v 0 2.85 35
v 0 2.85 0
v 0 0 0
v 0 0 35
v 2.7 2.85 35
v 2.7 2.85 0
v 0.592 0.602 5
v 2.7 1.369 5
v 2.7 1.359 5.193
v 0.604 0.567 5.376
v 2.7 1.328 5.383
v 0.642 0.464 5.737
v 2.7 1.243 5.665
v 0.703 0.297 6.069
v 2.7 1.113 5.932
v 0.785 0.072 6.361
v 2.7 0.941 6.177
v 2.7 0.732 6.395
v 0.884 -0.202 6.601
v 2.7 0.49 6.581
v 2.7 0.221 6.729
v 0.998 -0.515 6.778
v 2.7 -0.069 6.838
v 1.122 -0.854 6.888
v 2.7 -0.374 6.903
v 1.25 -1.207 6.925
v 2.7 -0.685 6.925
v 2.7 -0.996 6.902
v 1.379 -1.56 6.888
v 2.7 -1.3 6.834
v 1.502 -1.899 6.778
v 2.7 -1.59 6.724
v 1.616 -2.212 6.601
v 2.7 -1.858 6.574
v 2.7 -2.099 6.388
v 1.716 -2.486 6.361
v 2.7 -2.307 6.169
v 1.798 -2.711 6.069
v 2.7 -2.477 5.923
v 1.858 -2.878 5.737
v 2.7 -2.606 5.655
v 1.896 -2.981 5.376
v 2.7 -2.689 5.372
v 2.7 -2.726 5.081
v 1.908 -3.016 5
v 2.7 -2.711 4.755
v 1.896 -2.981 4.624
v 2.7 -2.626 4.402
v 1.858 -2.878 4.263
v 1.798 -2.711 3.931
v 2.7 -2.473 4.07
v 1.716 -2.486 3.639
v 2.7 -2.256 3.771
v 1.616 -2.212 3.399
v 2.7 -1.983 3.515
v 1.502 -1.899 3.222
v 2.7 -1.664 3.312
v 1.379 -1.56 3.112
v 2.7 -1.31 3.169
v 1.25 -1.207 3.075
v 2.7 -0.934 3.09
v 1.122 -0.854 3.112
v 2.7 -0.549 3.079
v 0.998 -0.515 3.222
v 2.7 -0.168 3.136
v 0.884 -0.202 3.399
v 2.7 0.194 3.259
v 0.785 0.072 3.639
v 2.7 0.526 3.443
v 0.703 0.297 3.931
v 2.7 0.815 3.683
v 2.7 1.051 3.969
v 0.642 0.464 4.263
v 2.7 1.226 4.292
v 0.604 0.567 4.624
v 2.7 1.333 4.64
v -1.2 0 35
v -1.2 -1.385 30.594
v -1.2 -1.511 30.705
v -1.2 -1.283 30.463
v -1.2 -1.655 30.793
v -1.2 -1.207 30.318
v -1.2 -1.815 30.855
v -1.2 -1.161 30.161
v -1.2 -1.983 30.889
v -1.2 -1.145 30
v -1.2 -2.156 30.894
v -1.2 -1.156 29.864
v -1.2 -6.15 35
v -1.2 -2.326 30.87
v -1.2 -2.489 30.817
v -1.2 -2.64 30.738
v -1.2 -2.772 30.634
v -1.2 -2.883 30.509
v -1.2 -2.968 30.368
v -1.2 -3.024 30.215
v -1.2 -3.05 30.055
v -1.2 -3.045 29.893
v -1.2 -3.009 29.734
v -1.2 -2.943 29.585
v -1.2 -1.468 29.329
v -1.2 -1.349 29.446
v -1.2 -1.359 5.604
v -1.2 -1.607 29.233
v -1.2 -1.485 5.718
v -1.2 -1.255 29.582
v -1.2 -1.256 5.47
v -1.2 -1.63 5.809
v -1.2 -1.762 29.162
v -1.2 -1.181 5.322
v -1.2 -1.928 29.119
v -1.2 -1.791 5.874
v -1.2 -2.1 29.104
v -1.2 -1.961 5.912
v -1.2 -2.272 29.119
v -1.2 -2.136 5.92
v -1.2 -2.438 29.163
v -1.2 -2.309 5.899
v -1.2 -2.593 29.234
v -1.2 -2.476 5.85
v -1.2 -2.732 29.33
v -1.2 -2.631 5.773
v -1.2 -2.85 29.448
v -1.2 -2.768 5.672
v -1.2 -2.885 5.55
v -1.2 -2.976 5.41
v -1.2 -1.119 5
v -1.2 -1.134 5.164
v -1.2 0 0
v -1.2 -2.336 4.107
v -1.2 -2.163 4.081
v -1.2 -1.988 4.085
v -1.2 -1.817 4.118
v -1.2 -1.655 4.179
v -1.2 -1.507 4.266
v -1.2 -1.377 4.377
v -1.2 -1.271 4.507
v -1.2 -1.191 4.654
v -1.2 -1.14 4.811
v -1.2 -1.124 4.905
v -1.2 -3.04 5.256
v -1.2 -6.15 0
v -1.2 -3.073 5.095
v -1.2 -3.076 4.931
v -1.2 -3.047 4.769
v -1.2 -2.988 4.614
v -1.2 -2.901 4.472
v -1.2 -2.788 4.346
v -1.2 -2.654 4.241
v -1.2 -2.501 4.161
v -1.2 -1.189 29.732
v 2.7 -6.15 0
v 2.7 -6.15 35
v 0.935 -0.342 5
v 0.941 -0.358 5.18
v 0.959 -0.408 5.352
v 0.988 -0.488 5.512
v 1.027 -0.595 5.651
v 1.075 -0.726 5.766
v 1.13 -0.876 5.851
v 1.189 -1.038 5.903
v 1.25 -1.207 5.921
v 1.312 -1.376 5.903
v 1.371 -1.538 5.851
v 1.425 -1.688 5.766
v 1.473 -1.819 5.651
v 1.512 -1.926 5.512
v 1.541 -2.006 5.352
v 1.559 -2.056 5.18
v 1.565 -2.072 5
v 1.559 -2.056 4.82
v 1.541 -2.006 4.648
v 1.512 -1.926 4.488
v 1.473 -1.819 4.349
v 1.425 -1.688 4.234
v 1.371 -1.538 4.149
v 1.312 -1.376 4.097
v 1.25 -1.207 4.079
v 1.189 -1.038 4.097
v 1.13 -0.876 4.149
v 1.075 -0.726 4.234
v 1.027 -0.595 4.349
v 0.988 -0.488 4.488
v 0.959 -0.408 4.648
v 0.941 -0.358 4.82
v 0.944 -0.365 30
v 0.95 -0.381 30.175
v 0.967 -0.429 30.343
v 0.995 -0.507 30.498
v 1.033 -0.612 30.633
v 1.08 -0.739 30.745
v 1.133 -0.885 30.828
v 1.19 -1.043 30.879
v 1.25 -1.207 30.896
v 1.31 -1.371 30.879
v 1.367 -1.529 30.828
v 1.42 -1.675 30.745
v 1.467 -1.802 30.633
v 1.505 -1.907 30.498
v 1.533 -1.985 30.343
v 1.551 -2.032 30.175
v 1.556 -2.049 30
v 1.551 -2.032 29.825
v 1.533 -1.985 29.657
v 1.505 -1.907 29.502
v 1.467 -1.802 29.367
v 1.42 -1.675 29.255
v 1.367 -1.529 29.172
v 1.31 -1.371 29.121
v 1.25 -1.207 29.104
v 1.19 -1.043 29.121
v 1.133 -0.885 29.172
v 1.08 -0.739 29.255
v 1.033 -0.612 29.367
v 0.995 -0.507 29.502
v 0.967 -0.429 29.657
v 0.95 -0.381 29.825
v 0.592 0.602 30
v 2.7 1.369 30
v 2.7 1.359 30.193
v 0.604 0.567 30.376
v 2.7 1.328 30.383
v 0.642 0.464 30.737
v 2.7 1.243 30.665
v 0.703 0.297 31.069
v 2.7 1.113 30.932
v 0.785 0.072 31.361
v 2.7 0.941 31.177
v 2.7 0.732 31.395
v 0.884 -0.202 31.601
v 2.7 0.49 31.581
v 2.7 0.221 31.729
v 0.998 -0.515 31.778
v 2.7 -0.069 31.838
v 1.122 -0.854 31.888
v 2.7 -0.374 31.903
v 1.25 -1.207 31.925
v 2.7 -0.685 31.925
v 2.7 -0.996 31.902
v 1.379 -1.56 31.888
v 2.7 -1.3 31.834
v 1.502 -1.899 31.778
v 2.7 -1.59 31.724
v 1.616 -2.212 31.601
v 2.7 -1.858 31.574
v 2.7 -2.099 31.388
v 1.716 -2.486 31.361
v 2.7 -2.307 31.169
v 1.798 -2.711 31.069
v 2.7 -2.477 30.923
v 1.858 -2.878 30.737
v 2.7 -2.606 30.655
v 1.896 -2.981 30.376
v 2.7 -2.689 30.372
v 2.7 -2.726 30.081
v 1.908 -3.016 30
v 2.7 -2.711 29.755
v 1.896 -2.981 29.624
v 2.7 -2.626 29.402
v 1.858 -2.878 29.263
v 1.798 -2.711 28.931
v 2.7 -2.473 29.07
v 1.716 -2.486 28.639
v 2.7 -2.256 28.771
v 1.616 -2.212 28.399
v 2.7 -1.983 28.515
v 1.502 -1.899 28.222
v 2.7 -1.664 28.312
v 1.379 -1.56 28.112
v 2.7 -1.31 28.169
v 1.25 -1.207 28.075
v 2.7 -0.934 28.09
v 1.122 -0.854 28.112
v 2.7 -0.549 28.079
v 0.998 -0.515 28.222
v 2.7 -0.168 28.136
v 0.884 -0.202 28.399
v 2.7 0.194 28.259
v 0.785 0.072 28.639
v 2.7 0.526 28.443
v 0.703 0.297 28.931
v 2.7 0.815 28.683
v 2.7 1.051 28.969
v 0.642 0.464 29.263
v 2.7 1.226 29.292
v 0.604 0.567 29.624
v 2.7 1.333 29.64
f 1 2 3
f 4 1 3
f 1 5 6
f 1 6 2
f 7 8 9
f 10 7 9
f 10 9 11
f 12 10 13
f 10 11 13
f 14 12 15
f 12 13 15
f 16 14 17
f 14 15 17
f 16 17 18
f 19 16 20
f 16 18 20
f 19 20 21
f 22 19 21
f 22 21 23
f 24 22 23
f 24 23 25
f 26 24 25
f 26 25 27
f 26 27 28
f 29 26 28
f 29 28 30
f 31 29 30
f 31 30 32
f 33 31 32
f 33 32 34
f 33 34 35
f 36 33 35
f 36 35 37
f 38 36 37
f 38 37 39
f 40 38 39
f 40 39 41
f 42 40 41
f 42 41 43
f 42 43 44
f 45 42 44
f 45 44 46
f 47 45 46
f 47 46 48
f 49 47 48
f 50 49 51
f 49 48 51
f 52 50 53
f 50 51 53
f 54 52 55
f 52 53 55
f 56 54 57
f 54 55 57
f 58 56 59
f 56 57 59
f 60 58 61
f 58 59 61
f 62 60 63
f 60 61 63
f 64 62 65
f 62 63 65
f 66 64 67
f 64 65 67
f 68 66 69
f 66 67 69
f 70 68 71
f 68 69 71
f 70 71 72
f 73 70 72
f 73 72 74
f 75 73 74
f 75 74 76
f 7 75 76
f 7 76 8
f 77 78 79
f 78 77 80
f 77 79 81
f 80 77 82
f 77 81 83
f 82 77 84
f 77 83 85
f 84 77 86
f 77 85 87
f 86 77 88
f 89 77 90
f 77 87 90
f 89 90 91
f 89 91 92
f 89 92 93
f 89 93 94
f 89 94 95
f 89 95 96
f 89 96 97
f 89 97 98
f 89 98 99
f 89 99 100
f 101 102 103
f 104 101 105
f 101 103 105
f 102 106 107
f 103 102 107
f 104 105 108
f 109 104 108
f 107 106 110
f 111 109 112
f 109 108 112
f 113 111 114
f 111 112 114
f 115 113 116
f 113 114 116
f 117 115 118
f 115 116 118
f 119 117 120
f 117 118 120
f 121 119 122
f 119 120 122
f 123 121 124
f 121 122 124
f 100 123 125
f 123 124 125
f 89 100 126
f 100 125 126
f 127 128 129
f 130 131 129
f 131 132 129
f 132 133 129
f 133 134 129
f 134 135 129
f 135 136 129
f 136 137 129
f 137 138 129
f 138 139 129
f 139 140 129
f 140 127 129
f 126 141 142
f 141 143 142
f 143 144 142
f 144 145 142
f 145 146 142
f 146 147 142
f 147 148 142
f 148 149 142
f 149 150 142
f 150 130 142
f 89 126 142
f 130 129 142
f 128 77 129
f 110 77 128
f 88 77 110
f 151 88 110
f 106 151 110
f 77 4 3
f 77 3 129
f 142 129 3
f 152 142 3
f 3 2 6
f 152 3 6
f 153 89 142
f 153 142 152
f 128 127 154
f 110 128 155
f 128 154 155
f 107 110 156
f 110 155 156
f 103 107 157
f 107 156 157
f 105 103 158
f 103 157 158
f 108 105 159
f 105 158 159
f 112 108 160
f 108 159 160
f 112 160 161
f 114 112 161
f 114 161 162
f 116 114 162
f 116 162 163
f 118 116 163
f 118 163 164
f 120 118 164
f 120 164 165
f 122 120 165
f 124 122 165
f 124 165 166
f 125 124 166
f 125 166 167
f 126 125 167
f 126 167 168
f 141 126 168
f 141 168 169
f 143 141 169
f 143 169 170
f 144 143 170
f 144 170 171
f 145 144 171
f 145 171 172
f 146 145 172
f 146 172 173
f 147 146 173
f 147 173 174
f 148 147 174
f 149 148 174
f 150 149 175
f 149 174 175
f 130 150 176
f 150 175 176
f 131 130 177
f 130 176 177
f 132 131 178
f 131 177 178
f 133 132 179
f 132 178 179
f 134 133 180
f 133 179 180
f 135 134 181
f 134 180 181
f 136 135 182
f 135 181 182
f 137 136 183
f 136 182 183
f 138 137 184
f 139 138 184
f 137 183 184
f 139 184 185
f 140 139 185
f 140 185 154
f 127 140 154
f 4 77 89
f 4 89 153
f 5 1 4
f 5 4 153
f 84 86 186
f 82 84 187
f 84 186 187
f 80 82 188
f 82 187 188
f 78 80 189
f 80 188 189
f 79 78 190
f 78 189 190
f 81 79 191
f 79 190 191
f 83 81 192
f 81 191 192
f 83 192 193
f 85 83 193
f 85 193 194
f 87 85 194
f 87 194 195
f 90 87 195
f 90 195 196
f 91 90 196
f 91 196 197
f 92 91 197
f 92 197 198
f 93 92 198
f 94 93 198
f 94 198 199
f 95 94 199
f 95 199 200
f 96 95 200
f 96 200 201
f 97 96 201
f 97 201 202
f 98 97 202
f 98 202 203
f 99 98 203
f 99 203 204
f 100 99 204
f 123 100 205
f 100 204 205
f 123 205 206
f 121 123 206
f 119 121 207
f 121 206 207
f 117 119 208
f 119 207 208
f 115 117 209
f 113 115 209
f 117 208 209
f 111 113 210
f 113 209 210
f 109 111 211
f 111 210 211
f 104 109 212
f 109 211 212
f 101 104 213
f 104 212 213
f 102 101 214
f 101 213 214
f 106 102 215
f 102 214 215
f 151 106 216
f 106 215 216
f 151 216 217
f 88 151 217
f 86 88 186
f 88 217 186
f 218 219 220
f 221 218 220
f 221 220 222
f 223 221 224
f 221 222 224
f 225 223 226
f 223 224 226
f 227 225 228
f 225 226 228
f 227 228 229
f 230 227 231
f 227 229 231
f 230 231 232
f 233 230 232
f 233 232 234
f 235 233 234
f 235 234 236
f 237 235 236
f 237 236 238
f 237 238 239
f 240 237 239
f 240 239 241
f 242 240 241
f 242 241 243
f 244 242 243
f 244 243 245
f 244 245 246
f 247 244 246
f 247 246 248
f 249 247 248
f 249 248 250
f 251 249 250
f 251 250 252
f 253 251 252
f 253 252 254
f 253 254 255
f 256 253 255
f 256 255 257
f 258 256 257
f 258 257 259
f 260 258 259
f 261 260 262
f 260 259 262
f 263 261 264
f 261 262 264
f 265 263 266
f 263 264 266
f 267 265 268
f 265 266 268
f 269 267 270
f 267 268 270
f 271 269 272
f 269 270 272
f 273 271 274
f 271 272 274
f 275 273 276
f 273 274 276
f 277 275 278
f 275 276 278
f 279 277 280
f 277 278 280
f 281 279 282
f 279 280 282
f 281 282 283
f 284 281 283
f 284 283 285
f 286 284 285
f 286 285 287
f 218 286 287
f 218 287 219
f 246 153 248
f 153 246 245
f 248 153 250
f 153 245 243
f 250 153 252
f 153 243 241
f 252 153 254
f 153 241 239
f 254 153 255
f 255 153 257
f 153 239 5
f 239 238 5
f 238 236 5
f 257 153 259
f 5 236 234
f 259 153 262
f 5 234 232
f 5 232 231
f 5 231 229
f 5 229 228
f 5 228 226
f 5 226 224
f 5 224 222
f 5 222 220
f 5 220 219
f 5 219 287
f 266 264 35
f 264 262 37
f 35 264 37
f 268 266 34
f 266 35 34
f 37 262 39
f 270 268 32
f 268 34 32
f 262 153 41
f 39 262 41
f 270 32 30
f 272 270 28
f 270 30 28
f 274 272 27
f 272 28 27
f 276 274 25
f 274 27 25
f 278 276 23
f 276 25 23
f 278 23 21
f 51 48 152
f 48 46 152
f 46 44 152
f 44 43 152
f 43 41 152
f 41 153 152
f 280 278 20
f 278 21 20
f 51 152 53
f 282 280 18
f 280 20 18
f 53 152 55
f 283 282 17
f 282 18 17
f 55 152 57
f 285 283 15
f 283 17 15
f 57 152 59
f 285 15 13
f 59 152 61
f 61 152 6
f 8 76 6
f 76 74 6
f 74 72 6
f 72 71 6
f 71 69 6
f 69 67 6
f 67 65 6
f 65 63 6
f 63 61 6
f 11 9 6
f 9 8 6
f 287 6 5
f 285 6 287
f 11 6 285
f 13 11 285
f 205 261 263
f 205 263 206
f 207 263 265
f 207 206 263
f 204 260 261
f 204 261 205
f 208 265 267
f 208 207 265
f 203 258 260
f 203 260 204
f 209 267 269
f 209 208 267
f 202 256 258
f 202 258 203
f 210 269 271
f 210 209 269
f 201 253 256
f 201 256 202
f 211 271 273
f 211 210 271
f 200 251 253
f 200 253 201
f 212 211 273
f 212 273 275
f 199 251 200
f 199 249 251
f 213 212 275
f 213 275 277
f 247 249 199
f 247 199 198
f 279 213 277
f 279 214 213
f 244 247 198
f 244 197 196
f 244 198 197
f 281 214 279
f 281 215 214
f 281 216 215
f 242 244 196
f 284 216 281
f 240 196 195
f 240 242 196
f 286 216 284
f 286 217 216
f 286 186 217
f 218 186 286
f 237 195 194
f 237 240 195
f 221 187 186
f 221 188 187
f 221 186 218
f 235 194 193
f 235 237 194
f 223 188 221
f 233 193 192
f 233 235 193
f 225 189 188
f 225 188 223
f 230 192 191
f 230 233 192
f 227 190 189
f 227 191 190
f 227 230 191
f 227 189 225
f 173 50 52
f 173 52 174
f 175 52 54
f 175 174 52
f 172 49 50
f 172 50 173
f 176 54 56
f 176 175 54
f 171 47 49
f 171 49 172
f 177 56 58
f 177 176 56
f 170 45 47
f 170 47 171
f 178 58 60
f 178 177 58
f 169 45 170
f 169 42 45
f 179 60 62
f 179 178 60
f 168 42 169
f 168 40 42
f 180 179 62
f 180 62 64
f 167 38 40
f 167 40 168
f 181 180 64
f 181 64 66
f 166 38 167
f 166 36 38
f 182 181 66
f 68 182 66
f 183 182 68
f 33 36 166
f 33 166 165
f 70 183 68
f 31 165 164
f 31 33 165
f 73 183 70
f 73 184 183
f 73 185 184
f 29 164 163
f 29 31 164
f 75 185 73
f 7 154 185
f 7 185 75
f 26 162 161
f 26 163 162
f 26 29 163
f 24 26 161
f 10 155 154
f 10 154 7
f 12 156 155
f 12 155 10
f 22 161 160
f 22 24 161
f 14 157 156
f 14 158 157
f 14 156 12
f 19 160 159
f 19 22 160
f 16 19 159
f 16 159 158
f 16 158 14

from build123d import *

# Parameters (mm, degrees)
F1_DEPTH = 35
F3_R     = 0.895736
F3_R_2   = 0.920741
F4_DEPTH = 6.743983
F5_R     = 1.925
F6_DEPTH = 2.75


with BuildPart() as f1:
    # F0 (on Top) → F1 (new body)
    with BuildSketch(Plane.XY):
        Polygon((0, 2.85), (0, 0), (-1.2, 0), (-1.2, -6.15), (2.7, -6.15), (2.7, 2.85), align=None)
    extrude(amount=F1_DEPTH)

    # F3 (on face) → F4 (cut, through all)
    with BuildSketch(Plane(origin=(3.300132, 1.20115, 0), x_dir=(-0.34202, 0.939693, 0), z_dir=(0.939693, 0.34202, 0))):
        with Locations((-1.561705, 30)):
            Circle(F3_R)
        with Locations((-1.561705, 5)):
            Circle(F3_R_2)
    extrude(amount=-F4_DEPTH, mode=Mode.SUBTRACT)

    # F5 (on face) → F6 (cut)
    with BuildSketch(Plane(origin=(3.300132, 1.20115, 0), x_dir=(-0.34202, 0.939693, 0), z_dir=(0.939693, 0.34202, 0))):
        with Locations((-1.561705, 30)):
            Circle(F5_R)
        with Locations((-1.561705, 5)):
            Circle(F5_R)
    extrude(amount=-F6_DEPTH, mode=Mode.SUBTRACT)


solid = f1.part
